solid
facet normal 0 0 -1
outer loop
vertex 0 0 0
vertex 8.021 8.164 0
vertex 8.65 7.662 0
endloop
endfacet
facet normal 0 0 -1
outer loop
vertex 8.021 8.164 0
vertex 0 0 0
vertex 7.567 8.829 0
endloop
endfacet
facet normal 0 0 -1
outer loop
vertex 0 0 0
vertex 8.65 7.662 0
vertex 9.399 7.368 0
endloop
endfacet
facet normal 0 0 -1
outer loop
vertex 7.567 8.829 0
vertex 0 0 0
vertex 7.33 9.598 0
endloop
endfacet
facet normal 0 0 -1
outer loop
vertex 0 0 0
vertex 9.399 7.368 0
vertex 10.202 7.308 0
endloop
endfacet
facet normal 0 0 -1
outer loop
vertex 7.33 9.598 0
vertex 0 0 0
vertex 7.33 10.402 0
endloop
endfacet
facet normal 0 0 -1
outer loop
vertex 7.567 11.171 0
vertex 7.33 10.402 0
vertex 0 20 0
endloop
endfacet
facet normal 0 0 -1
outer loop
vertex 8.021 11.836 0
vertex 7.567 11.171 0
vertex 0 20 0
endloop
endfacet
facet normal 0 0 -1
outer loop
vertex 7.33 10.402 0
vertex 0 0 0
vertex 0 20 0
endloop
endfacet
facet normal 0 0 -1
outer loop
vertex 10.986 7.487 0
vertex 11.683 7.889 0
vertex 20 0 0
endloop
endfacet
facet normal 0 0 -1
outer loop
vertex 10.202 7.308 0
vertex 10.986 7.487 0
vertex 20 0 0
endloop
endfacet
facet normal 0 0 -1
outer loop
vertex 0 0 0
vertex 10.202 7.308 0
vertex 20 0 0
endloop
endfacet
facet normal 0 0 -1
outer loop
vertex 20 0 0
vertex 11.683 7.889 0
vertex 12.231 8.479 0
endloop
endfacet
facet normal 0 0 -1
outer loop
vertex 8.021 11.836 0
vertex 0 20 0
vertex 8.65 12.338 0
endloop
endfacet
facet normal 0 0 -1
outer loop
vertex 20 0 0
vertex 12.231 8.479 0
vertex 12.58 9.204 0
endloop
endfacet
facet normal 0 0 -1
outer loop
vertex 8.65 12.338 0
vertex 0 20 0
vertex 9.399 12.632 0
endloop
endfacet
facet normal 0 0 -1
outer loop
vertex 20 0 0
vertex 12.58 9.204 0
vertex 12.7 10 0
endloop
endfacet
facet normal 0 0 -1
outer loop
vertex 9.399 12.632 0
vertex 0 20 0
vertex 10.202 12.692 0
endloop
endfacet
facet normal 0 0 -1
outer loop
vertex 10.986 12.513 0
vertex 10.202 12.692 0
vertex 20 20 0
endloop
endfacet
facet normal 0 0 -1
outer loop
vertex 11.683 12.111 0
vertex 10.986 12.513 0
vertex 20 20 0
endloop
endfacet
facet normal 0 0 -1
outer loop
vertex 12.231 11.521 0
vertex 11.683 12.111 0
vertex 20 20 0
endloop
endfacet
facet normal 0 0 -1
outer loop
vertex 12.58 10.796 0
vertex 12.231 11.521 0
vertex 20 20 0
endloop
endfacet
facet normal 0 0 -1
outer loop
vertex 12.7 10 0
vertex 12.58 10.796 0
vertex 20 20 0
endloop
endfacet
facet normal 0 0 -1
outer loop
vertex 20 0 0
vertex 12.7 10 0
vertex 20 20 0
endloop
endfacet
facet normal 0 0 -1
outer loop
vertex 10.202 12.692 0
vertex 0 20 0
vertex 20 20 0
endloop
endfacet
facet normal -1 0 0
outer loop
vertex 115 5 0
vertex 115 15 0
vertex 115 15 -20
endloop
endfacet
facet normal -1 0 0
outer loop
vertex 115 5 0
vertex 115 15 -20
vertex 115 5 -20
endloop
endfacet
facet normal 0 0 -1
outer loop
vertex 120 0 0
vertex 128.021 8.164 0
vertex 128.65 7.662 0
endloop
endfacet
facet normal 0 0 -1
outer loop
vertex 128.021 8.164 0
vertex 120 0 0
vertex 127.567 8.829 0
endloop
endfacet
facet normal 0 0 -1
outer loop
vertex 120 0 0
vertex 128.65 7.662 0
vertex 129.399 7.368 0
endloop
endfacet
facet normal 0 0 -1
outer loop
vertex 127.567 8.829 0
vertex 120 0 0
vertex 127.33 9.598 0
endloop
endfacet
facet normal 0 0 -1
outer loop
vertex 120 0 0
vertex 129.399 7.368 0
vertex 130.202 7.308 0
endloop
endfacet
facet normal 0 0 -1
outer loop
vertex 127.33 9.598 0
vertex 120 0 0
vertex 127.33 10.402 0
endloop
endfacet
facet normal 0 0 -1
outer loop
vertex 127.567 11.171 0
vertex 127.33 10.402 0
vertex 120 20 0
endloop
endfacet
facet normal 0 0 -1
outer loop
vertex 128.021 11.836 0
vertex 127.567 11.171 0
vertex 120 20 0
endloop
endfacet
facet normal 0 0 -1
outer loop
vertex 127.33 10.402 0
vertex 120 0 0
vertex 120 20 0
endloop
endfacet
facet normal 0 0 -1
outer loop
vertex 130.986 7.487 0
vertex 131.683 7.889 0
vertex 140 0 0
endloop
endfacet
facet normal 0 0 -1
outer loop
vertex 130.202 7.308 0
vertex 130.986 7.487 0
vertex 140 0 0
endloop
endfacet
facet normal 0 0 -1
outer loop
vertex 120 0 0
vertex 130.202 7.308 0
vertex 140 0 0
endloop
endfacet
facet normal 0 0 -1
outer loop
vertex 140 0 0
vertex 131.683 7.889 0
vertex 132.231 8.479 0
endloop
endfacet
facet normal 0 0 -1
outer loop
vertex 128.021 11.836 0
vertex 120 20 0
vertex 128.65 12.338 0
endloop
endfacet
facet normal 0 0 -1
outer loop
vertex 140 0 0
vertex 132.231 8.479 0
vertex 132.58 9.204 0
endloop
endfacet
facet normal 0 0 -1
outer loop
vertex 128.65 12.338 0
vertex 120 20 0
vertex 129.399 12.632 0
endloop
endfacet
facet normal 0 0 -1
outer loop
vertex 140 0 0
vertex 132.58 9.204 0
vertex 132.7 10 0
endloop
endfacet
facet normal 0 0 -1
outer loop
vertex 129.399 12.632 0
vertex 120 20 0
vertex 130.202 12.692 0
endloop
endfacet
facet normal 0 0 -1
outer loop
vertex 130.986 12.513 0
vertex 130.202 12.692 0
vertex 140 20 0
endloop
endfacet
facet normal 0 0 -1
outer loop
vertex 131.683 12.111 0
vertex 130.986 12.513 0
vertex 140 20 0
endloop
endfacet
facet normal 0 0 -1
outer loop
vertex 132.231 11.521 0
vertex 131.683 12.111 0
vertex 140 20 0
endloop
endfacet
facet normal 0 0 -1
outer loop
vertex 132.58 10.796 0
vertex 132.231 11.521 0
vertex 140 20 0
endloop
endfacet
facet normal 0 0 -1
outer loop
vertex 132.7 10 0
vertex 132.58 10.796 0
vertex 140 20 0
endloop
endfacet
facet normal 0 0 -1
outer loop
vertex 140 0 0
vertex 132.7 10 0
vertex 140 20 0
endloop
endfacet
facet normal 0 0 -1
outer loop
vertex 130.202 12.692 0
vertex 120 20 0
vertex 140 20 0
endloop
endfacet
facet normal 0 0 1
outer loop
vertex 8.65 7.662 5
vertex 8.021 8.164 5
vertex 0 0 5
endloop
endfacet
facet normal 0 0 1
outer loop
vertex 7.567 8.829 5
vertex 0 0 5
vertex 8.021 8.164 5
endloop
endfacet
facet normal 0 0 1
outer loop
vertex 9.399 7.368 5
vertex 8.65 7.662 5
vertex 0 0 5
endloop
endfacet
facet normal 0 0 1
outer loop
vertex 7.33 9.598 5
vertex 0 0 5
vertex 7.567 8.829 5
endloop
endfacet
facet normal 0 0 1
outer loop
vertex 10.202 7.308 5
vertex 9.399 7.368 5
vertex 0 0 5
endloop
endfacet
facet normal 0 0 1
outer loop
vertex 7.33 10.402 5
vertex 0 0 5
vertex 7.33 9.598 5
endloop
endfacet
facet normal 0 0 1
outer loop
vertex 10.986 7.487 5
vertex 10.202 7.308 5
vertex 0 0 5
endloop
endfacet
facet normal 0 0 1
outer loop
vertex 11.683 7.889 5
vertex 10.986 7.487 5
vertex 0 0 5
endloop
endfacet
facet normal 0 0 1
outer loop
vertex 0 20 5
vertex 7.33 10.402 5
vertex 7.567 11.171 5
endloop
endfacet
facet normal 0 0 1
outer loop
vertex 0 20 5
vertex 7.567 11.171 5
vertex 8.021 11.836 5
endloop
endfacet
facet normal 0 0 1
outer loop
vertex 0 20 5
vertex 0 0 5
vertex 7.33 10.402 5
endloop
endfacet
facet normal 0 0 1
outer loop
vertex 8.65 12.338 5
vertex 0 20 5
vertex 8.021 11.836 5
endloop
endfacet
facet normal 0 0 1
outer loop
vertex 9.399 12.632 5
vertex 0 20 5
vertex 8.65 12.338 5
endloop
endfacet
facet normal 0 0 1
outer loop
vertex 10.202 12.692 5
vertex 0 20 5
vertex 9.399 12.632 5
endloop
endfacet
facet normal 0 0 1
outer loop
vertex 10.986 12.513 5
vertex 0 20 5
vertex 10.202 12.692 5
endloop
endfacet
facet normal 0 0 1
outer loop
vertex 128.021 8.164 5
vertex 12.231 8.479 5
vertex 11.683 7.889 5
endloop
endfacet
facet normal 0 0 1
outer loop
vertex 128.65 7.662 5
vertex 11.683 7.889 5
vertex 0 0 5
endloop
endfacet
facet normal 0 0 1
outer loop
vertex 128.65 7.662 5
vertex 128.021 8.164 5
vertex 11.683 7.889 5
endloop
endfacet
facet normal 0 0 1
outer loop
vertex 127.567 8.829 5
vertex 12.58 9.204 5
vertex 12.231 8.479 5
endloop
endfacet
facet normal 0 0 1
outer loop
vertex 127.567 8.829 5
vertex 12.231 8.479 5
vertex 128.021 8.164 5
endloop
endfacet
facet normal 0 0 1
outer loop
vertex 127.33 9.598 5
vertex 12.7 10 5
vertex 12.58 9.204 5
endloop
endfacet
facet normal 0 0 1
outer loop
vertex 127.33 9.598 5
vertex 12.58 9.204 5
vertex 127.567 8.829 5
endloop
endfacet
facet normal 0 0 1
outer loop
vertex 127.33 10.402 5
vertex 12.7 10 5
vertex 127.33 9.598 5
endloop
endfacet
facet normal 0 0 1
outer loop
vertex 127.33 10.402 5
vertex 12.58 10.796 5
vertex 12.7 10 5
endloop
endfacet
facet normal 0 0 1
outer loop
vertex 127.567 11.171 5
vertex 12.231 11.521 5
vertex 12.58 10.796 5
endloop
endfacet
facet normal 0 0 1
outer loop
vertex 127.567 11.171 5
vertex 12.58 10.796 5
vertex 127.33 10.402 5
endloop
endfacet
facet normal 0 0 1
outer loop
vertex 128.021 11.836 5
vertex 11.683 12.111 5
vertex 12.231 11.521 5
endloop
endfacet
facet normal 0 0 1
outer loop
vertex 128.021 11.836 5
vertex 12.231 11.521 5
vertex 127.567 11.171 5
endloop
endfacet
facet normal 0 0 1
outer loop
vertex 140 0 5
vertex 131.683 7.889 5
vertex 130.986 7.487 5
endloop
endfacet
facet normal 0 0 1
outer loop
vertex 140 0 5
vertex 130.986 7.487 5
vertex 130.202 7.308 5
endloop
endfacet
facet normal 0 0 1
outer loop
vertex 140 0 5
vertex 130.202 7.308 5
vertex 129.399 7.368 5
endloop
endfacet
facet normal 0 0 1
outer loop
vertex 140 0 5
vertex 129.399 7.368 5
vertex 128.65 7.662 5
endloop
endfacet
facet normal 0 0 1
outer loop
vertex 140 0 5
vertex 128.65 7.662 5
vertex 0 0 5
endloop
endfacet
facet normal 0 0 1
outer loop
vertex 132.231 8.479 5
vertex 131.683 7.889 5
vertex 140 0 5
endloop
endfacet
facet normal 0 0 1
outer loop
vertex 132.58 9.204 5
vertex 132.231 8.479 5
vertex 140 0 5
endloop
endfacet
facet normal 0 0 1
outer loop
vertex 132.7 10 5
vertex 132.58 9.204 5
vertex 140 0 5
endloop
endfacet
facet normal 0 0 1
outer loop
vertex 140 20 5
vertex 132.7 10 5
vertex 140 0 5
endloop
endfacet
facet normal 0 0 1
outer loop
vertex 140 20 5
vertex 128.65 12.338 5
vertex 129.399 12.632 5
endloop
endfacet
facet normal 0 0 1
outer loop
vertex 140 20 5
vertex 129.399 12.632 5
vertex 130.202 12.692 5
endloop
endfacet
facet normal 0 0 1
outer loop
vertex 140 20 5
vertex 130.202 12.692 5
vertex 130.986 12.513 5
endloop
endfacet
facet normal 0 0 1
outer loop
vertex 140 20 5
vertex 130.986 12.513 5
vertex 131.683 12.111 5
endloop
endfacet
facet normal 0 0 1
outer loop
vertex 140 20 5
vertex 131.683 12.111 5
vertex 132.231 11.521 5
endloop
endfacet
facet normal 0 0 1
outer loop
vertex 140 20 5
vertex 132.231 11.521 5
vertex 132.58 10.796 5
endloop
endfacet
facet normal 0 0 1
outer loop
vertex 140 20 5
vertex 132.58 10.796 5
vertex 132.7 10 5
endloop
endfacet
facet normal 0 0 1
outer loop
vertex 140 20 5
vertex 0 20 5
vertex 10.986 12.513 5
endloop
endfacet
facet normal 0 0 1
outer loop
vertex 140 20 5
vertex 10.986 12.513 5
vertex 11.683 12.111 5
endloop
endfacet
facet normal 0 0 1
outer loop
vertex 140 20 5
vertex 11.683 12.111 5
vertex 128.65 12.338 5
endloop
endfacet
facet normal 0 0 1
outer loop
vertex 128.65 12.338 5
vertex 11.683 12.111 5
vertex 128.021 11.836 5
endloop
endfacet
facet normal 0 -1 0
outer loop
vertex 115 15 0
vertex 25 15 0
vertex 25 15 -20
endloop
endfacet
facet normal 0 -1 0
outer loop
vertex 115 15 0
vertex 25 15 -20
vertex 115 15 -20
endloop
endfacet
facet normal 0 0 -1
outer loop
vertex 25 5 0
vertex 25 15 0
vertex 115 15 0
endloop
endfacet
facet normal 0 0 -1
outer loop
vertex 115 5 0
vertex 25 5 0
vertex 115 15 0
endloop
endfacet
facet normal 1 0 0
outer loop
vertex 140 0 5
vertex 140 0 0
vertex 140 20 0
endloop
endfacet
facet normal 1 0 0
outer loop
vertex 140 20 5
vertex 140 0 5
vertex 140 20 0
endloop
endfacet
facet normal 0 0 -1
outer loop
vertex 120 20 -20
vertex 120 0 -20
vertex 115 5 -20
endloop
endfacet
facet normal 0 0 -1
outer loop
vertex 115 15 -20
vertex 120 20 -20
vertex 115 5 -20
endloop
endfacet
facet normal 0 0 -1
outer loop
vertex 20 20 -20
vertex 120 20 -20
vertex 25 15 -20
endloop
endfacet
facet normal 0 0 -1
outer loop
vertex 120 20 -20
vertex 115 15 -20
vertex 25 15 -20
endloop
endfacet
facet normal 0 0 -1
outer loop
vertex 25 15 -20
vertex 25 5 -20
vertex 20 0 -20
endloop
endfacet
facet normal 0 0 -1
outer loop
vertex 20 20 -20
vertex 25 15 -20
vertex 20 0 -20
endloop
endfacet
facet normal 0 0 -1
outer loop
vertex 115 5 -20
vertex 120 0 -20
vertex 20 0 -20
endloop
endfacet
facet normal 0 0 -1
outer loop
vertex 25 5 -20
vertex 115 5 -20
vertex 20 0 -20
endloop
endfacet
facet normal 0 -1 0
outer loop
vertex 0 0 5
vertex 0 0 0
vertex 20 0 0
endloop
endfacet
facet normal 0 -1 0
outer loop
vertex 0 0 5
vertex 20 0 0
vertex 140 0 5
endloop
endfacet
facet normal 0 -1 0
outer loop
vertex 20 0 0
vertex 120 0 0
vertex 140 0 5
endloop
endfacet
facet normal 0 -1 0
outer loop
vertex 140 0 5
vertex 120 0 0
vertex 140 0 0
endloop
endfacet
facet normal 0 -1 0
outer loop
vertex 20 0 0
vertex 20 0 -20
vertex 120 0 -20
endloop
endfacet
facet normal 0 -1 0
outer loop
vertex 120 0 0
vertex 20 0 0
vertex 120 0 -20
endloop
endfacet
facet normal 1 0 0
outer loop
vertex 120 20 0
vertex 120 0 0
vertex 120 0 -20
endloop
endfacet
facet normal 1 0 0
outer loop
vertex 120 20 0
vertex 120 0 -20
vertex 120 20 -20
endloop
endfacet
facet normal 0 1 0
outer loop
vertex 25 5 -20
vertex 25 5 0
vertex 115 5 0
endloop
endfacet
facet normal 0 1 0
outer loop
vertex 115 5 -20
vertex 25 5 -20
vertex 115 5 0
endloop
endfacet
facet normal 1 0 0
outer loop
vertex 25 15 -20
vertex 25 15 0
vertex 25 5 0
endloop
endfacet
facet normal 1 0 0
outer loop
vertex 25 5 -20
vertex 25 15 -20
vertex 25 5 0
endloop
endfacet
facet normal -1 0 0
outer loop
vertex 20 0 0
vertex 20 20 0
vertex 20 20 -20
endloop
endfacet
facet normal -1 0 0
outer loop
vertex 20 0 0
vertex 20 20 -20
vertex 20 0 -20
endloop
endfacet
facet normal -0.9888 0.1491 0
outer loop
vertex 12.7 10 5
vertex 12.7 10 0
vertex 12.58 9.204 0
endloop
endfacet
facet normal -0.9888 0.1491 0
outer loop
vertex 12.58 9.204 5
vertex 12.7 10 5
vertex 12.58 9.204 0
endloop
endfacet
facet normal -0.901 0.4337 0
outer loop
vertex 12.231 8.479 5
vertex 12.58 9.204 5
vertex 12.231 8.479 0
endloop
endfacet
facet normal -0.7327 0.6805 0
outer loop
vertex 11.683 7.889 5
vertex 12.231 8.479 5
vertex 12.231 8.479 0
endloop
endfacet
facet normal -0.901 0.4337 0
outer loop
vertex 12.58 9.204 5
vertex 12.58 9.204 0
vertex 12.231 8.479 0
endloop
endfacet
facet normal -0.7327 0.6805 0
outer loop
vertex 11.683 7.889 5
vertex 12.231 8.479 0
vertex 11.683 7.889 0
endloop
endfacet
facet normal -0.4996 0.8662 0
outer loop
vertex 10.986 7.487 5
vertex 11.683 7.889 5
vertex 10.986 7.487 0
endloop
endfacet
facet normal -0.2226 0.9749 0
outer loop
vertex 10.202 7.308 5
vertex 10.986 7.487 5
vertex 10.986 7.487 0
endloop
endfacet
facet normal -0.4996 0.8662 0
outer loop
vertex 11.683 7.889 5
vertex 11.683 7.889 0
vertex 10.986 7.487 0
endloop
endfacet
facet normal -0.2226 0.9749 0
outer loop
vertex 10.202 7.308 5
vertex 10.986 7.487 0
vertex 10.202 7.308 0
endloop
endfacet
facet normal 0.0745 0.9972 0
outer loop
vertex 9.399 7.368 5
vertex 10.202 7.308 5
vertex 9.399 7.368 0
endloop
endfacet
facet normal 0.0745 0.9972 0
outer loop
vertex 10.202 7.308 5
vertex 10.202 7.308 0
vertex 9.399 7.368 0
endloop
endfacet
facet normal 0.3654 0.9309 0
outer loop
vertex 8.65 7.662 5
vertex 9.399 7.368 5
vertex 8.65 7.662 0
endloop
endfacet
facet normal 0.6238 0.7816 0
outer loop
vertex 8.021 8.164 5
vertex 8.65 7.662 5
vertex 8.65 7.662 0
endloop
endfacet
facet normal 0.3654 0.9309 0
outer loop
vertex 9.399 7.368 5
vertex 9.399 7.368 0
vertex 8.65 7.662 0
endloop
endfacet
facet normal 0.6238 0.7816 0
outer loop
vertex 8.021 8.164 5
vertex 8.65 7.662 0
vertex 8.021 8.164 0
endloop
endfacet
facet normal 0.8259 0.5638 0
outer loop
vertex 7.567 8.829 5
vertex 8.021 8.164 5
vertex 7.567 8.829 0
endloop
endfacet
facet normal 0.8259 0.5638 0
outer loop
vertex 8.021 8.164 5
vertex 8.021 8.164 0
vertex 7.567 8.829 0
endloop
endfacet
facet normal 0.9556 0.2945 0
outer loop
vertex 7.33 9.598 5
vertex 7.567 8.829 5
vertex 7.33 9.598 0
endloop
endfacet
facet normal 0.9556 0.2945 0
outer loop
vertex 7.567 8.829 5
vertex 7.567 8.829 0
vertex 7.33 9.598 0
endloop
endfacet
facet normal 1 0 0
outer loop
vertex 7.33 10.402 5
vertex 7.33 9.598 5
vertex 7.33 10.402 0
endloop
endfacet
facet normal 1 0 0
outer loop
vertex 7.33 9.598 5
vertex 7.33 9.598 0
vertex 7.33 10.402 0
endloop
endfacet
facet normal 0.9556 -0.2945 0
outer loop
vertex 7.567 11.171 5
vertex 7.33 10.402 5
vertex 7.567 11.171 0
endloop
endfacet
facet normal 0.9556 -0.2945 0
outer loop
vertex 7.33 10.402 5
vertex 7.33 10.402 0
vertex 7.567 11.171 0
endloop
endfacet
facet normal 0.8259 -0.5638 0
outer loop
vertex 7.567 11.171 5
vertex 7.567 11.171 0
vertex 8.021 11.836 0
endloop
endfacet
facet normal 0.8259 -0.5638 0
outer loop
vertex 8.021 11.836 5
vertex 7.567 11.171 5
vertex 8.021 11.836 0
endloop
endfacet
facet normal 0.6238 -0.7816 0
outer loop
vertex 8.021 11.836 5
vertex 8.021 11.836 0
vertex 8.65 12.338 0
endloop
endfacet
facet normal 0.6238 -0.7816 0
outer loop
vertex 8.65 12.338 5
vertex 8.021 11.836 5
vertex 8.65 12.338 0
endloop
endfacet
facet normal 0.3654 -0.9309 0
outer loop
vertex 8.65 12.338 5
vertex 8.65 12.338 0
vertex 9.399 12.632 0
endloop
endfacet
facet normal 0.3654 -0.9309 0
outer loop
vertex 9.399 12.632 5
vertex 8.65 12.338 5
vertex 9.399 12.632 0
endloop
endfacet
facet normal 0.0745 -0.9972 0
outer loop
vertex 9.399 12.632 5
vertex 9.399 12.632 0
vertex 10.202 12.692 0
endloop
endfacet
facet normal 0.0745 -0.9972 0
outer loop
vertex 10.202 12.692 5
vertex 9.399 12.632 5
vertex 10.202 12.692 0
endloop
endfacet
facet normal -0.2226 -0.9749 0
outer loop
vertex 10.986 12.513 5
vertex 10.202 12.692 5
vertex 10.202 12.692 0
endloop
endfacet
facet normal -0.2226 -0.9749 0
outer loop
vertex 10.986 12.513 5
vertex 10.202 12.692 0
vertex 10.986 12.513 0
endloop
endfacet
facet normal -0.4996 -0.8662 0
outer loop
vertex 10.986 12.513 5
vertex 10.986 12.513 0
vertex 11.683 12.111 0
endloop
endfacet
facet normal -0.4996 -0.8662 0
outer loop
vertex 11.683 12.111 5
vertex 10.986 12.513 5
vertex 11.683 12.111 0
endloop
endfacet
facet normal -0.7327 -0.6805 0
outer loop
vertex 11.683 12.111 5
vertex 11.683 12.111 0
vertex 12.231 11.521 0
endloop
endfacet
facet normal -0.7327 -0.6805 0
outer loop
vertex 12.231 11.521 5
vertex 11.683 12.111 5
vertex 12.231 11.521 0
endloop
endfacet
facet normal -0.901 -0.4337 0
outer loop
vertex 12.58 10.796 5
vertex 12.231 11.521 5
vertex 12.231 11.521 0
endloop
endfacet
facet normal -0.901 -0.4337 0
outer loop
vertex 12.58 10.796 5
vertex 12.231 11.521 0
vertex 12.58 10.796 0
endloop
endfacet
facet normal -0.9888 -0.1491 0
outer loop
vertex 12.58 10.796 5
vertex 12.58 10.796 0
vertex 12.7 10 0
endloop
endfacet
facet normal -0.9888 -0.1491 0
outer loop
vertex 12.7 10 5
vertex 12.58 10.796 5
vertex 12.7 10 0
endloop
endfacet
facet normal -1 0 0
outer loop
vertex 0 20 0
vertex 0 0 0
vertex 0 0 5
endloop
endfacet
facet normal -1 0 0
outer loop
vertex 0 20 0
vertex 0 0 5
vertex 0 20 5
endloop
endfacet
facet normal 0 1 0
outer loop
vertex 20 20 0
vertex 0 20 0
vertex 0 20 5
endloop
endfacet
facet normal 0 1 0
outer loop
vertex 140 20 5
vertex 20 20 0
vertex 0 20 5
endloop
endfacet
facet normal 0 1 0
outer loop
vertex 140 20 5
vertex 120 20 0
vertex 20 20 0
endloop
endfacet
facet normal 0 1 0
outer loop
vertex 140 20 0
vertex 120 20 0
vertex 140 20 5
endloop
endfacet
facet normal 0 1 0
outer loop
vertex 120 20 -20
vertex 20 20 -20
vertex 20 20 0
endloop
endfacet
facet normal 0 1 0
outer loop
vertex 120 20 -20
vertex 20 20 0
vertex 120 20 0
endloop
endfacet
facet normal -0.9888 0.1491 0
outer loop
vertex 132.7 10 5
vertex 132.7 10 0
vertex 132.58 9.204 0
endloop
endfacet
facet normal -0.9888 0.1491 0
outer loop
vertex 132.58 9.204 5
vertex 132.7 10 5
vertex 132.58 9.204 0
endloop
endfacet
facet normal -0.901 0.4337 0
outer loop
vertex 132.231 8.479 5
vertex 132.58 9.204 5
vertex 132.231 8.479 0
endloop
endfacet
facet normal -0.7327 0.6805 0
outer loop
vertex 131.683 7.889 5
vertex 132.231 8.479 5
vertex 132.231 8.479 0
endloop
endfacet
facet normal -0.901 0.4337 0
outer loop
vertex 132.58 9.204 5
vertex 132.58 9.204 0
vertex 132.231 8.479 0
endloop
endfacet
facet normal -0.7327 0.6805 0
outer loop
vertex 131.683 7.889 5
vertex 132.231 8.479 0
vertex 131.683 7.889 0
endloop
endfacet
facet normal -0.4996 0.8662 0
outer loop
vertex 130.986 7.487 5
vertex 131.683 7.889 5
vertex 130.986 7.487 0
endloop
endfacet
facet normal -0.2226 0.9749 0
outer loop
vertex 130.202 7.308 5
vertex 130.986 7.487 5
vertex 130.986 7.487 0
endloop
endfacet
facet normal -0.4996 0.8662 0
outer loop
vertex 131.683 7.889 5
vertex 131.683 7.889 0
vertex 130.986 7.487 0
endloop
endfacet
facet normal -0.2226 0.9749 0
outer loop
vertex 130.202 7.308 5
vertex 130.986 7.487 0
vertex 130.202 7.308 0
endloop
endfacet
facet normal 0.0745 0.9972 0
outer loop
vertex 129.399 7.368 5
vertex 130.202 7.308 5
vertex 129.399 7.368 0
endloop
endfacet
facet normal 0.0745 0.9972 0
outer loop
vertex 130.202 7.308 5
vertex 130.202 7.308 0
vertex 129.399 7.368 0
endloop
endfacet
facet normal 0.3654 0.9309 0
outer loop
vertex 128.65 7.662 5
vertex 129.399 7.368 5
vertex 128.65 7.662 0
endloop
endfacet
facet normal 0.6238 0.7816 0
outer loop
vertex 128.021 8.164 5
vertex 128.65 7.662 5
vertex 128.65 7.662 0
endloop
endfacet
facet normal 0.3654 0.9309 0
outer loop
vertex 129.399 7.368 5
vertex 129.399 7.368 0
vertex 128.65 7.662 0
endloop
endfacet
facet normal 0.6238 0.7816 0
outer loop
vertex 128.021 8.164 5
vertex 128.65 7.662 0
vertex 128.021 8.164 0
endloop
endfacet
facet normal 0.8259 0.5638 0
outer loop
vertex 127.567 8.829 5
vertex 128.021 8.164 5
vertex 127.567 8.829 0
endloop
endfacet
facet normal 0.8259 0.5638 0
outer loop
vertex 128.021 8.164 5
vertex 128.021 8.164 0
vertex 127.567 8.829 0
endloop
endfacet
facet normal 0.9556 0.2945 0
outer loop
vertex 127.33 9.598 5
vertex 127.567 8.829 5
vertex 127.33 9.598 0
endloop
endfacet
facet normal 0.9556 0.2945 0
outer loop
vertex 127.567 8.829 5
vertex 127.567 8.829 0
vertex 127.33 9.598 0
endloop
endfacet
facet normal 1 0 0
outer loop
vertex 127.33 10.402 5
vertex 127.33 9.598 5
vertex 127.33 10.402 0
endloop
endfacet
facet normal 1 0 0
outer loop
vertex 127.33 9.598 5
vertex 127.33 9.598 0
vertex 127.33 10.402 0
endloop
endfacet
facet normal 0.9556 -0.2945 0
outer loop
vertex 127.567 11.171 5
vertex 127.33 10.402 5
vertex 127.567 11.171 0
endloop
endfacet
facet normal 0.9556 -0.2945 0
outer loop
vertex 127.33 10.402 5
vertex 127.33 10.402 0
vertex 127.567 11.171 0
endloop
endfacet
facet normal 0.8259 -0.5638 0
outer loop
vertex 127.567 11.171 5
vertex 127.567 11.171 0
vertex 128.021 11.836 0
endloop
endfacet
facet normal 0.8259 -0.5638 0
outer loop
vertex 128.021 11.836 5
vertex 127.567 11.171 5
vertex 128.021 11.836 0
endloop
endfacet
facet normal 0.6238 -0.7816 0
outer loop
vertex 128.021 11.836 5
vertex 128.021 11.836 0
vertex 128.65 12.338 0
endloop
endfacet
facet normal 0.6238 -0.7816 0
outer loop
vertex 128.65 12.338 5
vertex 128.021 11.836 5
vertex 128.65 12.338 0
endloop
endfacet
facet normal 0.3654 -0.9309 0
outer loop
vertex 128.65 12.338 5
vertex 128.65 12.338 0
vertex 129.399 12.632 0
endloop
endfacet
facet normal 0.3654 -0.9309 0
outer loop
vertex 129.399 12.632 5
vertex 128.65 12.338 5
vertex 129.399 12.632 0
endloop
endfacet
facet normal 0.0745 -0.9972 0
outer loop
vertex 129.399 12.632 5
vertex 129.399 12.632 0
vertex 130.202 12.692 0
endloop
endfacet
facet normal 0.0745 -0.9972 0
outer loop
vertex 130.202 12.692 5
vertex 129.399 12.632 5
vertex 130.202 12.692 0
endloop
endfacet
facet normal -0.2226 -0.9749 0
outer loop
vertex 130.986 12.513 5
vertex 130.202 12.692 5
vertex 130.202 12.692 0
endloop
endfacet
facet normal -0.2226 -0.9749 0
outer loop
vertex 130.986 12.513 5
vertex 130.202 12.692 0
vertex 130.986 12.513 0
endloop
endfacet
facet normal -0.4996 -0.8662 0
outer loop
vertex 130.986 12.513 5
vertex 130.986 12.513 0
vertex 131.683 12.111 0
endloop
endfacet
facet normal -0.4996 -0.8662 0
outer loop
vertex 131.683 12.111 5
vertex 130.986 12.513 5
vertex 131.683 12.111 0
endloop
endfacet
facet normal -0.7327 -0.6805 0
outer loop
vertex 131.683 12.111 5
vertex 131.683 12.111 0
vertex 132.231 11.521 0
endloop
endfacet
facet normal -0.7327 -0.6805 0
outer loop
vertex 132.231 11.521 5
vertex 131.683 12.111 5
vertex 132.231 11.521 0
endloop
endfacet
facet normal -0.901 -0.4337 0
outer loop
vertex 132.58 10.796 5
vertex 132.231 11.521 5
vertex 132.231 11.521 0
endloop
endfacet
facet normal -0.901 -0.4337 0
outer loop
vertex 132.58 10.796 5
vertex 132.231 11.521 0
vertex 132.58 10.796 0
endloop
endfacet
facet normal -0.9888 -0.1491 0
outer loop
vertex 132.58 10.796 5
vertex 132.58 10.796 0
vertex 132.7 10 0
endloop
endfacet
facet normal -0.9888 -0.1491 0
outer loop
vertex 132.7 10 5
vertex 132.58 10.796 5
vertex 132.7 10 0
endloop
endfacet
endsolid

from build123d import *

# Parameters (mm, degrees)
SKETCH026_W     = 140
SKETCH026_H     = 20
PAD024_DEPTH    = 5
SKETCH027_W     = 90
SKETCH027_H     = 10
PAD025_DEPTH    = 20
SKETCH028_R     = 2.7
POCKET002_DEPTH = 5.001


with BuildPart() as part:
    # Sketch026 → Pad024 (new body)
    with BuildSketch(Plane.XY):
        with Locations((70, 10)):
            Rectangle(SKETCH026_W, SKETCH026_H)
    extrude(amount=PAD024_DEPTH)

    # Sketch027 (on Face5 of Pad024) → Pad025 (join)
    with BuildSketch(Plane(origin=(0, 0, 0), x_dir=(1, 0, 0), z_dir=(0, 0, -1))):
        Polygon((20, 0), (25, 0), (115, 0), (120, 0), (120, -20), (115, -20), (25, -20), (20, -20), align=None)
        with Locations((70, -10)):
            Rectangle(SKETCH027_W, SKETCH027_H, mode=Mode.SUBTRACT)
    extrude(amount=PAD025_DEPTH)

    # Sketch028 (on Face4 of Pad025) → Pocket002 (cut, through all)
    with BuildSketch(Plane(origin=(0, 0, 0), x_dir=(1, 0, 0), z_dir=(0, 0, -1))):
        with Locations((10, -10)):
            Circle(SKETCH028_R)
        with Locations((130, -10)):
            Circle(SKETCH028_R)
    extrude(amount=-POCKET002_DEPTH, mode=Mode.SUBTRACT)


solid = part.part
